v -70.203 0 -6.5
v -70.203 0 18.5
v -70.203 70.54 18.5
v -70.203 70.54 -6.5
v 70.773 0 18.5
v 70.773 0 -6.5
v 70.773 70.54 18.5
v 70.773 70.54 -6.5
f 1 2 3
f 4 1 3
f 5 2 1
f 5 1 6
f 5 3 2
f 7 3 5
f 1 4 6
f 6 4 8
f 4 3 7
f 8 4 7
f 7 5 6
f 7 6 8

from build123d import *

# Parameters (mm, degrees)
F0_W     = 140.9761607647
F0_H     = 70.5401301384
F1_DEPTH = 10
F2_DEPTH = 8.5
F3_DEPTH = 25


with BuildPart() as f1:
    # F0 (on Top) → F1 (new body)
    with BuildSketch(Plane.XY):
        with Locations((0.2849400043, 35.2700650692)):
            Rectangle(F0_W, F0_H)
    extrude(amount=F1_DEPTH)

    # F2 (add): a face of the model
    f2_faces = [f1.faces().sort_by_distance(p)[0] for p in [
        (0.2849400043, 35.2700650692, 10),
    ]]
    extrude(f2_faces, amount=F2_DEPTH)

    # F3 (add): a face of the model
    f3_faces = [f1.faces().sort_by_distance(p)[0] for p in [
        (0.2849400043, 35.2700650692, 18.5),
    ]]
    extrude(f3_faces, amount=-F3_DEPTH)


solid = f1.part
